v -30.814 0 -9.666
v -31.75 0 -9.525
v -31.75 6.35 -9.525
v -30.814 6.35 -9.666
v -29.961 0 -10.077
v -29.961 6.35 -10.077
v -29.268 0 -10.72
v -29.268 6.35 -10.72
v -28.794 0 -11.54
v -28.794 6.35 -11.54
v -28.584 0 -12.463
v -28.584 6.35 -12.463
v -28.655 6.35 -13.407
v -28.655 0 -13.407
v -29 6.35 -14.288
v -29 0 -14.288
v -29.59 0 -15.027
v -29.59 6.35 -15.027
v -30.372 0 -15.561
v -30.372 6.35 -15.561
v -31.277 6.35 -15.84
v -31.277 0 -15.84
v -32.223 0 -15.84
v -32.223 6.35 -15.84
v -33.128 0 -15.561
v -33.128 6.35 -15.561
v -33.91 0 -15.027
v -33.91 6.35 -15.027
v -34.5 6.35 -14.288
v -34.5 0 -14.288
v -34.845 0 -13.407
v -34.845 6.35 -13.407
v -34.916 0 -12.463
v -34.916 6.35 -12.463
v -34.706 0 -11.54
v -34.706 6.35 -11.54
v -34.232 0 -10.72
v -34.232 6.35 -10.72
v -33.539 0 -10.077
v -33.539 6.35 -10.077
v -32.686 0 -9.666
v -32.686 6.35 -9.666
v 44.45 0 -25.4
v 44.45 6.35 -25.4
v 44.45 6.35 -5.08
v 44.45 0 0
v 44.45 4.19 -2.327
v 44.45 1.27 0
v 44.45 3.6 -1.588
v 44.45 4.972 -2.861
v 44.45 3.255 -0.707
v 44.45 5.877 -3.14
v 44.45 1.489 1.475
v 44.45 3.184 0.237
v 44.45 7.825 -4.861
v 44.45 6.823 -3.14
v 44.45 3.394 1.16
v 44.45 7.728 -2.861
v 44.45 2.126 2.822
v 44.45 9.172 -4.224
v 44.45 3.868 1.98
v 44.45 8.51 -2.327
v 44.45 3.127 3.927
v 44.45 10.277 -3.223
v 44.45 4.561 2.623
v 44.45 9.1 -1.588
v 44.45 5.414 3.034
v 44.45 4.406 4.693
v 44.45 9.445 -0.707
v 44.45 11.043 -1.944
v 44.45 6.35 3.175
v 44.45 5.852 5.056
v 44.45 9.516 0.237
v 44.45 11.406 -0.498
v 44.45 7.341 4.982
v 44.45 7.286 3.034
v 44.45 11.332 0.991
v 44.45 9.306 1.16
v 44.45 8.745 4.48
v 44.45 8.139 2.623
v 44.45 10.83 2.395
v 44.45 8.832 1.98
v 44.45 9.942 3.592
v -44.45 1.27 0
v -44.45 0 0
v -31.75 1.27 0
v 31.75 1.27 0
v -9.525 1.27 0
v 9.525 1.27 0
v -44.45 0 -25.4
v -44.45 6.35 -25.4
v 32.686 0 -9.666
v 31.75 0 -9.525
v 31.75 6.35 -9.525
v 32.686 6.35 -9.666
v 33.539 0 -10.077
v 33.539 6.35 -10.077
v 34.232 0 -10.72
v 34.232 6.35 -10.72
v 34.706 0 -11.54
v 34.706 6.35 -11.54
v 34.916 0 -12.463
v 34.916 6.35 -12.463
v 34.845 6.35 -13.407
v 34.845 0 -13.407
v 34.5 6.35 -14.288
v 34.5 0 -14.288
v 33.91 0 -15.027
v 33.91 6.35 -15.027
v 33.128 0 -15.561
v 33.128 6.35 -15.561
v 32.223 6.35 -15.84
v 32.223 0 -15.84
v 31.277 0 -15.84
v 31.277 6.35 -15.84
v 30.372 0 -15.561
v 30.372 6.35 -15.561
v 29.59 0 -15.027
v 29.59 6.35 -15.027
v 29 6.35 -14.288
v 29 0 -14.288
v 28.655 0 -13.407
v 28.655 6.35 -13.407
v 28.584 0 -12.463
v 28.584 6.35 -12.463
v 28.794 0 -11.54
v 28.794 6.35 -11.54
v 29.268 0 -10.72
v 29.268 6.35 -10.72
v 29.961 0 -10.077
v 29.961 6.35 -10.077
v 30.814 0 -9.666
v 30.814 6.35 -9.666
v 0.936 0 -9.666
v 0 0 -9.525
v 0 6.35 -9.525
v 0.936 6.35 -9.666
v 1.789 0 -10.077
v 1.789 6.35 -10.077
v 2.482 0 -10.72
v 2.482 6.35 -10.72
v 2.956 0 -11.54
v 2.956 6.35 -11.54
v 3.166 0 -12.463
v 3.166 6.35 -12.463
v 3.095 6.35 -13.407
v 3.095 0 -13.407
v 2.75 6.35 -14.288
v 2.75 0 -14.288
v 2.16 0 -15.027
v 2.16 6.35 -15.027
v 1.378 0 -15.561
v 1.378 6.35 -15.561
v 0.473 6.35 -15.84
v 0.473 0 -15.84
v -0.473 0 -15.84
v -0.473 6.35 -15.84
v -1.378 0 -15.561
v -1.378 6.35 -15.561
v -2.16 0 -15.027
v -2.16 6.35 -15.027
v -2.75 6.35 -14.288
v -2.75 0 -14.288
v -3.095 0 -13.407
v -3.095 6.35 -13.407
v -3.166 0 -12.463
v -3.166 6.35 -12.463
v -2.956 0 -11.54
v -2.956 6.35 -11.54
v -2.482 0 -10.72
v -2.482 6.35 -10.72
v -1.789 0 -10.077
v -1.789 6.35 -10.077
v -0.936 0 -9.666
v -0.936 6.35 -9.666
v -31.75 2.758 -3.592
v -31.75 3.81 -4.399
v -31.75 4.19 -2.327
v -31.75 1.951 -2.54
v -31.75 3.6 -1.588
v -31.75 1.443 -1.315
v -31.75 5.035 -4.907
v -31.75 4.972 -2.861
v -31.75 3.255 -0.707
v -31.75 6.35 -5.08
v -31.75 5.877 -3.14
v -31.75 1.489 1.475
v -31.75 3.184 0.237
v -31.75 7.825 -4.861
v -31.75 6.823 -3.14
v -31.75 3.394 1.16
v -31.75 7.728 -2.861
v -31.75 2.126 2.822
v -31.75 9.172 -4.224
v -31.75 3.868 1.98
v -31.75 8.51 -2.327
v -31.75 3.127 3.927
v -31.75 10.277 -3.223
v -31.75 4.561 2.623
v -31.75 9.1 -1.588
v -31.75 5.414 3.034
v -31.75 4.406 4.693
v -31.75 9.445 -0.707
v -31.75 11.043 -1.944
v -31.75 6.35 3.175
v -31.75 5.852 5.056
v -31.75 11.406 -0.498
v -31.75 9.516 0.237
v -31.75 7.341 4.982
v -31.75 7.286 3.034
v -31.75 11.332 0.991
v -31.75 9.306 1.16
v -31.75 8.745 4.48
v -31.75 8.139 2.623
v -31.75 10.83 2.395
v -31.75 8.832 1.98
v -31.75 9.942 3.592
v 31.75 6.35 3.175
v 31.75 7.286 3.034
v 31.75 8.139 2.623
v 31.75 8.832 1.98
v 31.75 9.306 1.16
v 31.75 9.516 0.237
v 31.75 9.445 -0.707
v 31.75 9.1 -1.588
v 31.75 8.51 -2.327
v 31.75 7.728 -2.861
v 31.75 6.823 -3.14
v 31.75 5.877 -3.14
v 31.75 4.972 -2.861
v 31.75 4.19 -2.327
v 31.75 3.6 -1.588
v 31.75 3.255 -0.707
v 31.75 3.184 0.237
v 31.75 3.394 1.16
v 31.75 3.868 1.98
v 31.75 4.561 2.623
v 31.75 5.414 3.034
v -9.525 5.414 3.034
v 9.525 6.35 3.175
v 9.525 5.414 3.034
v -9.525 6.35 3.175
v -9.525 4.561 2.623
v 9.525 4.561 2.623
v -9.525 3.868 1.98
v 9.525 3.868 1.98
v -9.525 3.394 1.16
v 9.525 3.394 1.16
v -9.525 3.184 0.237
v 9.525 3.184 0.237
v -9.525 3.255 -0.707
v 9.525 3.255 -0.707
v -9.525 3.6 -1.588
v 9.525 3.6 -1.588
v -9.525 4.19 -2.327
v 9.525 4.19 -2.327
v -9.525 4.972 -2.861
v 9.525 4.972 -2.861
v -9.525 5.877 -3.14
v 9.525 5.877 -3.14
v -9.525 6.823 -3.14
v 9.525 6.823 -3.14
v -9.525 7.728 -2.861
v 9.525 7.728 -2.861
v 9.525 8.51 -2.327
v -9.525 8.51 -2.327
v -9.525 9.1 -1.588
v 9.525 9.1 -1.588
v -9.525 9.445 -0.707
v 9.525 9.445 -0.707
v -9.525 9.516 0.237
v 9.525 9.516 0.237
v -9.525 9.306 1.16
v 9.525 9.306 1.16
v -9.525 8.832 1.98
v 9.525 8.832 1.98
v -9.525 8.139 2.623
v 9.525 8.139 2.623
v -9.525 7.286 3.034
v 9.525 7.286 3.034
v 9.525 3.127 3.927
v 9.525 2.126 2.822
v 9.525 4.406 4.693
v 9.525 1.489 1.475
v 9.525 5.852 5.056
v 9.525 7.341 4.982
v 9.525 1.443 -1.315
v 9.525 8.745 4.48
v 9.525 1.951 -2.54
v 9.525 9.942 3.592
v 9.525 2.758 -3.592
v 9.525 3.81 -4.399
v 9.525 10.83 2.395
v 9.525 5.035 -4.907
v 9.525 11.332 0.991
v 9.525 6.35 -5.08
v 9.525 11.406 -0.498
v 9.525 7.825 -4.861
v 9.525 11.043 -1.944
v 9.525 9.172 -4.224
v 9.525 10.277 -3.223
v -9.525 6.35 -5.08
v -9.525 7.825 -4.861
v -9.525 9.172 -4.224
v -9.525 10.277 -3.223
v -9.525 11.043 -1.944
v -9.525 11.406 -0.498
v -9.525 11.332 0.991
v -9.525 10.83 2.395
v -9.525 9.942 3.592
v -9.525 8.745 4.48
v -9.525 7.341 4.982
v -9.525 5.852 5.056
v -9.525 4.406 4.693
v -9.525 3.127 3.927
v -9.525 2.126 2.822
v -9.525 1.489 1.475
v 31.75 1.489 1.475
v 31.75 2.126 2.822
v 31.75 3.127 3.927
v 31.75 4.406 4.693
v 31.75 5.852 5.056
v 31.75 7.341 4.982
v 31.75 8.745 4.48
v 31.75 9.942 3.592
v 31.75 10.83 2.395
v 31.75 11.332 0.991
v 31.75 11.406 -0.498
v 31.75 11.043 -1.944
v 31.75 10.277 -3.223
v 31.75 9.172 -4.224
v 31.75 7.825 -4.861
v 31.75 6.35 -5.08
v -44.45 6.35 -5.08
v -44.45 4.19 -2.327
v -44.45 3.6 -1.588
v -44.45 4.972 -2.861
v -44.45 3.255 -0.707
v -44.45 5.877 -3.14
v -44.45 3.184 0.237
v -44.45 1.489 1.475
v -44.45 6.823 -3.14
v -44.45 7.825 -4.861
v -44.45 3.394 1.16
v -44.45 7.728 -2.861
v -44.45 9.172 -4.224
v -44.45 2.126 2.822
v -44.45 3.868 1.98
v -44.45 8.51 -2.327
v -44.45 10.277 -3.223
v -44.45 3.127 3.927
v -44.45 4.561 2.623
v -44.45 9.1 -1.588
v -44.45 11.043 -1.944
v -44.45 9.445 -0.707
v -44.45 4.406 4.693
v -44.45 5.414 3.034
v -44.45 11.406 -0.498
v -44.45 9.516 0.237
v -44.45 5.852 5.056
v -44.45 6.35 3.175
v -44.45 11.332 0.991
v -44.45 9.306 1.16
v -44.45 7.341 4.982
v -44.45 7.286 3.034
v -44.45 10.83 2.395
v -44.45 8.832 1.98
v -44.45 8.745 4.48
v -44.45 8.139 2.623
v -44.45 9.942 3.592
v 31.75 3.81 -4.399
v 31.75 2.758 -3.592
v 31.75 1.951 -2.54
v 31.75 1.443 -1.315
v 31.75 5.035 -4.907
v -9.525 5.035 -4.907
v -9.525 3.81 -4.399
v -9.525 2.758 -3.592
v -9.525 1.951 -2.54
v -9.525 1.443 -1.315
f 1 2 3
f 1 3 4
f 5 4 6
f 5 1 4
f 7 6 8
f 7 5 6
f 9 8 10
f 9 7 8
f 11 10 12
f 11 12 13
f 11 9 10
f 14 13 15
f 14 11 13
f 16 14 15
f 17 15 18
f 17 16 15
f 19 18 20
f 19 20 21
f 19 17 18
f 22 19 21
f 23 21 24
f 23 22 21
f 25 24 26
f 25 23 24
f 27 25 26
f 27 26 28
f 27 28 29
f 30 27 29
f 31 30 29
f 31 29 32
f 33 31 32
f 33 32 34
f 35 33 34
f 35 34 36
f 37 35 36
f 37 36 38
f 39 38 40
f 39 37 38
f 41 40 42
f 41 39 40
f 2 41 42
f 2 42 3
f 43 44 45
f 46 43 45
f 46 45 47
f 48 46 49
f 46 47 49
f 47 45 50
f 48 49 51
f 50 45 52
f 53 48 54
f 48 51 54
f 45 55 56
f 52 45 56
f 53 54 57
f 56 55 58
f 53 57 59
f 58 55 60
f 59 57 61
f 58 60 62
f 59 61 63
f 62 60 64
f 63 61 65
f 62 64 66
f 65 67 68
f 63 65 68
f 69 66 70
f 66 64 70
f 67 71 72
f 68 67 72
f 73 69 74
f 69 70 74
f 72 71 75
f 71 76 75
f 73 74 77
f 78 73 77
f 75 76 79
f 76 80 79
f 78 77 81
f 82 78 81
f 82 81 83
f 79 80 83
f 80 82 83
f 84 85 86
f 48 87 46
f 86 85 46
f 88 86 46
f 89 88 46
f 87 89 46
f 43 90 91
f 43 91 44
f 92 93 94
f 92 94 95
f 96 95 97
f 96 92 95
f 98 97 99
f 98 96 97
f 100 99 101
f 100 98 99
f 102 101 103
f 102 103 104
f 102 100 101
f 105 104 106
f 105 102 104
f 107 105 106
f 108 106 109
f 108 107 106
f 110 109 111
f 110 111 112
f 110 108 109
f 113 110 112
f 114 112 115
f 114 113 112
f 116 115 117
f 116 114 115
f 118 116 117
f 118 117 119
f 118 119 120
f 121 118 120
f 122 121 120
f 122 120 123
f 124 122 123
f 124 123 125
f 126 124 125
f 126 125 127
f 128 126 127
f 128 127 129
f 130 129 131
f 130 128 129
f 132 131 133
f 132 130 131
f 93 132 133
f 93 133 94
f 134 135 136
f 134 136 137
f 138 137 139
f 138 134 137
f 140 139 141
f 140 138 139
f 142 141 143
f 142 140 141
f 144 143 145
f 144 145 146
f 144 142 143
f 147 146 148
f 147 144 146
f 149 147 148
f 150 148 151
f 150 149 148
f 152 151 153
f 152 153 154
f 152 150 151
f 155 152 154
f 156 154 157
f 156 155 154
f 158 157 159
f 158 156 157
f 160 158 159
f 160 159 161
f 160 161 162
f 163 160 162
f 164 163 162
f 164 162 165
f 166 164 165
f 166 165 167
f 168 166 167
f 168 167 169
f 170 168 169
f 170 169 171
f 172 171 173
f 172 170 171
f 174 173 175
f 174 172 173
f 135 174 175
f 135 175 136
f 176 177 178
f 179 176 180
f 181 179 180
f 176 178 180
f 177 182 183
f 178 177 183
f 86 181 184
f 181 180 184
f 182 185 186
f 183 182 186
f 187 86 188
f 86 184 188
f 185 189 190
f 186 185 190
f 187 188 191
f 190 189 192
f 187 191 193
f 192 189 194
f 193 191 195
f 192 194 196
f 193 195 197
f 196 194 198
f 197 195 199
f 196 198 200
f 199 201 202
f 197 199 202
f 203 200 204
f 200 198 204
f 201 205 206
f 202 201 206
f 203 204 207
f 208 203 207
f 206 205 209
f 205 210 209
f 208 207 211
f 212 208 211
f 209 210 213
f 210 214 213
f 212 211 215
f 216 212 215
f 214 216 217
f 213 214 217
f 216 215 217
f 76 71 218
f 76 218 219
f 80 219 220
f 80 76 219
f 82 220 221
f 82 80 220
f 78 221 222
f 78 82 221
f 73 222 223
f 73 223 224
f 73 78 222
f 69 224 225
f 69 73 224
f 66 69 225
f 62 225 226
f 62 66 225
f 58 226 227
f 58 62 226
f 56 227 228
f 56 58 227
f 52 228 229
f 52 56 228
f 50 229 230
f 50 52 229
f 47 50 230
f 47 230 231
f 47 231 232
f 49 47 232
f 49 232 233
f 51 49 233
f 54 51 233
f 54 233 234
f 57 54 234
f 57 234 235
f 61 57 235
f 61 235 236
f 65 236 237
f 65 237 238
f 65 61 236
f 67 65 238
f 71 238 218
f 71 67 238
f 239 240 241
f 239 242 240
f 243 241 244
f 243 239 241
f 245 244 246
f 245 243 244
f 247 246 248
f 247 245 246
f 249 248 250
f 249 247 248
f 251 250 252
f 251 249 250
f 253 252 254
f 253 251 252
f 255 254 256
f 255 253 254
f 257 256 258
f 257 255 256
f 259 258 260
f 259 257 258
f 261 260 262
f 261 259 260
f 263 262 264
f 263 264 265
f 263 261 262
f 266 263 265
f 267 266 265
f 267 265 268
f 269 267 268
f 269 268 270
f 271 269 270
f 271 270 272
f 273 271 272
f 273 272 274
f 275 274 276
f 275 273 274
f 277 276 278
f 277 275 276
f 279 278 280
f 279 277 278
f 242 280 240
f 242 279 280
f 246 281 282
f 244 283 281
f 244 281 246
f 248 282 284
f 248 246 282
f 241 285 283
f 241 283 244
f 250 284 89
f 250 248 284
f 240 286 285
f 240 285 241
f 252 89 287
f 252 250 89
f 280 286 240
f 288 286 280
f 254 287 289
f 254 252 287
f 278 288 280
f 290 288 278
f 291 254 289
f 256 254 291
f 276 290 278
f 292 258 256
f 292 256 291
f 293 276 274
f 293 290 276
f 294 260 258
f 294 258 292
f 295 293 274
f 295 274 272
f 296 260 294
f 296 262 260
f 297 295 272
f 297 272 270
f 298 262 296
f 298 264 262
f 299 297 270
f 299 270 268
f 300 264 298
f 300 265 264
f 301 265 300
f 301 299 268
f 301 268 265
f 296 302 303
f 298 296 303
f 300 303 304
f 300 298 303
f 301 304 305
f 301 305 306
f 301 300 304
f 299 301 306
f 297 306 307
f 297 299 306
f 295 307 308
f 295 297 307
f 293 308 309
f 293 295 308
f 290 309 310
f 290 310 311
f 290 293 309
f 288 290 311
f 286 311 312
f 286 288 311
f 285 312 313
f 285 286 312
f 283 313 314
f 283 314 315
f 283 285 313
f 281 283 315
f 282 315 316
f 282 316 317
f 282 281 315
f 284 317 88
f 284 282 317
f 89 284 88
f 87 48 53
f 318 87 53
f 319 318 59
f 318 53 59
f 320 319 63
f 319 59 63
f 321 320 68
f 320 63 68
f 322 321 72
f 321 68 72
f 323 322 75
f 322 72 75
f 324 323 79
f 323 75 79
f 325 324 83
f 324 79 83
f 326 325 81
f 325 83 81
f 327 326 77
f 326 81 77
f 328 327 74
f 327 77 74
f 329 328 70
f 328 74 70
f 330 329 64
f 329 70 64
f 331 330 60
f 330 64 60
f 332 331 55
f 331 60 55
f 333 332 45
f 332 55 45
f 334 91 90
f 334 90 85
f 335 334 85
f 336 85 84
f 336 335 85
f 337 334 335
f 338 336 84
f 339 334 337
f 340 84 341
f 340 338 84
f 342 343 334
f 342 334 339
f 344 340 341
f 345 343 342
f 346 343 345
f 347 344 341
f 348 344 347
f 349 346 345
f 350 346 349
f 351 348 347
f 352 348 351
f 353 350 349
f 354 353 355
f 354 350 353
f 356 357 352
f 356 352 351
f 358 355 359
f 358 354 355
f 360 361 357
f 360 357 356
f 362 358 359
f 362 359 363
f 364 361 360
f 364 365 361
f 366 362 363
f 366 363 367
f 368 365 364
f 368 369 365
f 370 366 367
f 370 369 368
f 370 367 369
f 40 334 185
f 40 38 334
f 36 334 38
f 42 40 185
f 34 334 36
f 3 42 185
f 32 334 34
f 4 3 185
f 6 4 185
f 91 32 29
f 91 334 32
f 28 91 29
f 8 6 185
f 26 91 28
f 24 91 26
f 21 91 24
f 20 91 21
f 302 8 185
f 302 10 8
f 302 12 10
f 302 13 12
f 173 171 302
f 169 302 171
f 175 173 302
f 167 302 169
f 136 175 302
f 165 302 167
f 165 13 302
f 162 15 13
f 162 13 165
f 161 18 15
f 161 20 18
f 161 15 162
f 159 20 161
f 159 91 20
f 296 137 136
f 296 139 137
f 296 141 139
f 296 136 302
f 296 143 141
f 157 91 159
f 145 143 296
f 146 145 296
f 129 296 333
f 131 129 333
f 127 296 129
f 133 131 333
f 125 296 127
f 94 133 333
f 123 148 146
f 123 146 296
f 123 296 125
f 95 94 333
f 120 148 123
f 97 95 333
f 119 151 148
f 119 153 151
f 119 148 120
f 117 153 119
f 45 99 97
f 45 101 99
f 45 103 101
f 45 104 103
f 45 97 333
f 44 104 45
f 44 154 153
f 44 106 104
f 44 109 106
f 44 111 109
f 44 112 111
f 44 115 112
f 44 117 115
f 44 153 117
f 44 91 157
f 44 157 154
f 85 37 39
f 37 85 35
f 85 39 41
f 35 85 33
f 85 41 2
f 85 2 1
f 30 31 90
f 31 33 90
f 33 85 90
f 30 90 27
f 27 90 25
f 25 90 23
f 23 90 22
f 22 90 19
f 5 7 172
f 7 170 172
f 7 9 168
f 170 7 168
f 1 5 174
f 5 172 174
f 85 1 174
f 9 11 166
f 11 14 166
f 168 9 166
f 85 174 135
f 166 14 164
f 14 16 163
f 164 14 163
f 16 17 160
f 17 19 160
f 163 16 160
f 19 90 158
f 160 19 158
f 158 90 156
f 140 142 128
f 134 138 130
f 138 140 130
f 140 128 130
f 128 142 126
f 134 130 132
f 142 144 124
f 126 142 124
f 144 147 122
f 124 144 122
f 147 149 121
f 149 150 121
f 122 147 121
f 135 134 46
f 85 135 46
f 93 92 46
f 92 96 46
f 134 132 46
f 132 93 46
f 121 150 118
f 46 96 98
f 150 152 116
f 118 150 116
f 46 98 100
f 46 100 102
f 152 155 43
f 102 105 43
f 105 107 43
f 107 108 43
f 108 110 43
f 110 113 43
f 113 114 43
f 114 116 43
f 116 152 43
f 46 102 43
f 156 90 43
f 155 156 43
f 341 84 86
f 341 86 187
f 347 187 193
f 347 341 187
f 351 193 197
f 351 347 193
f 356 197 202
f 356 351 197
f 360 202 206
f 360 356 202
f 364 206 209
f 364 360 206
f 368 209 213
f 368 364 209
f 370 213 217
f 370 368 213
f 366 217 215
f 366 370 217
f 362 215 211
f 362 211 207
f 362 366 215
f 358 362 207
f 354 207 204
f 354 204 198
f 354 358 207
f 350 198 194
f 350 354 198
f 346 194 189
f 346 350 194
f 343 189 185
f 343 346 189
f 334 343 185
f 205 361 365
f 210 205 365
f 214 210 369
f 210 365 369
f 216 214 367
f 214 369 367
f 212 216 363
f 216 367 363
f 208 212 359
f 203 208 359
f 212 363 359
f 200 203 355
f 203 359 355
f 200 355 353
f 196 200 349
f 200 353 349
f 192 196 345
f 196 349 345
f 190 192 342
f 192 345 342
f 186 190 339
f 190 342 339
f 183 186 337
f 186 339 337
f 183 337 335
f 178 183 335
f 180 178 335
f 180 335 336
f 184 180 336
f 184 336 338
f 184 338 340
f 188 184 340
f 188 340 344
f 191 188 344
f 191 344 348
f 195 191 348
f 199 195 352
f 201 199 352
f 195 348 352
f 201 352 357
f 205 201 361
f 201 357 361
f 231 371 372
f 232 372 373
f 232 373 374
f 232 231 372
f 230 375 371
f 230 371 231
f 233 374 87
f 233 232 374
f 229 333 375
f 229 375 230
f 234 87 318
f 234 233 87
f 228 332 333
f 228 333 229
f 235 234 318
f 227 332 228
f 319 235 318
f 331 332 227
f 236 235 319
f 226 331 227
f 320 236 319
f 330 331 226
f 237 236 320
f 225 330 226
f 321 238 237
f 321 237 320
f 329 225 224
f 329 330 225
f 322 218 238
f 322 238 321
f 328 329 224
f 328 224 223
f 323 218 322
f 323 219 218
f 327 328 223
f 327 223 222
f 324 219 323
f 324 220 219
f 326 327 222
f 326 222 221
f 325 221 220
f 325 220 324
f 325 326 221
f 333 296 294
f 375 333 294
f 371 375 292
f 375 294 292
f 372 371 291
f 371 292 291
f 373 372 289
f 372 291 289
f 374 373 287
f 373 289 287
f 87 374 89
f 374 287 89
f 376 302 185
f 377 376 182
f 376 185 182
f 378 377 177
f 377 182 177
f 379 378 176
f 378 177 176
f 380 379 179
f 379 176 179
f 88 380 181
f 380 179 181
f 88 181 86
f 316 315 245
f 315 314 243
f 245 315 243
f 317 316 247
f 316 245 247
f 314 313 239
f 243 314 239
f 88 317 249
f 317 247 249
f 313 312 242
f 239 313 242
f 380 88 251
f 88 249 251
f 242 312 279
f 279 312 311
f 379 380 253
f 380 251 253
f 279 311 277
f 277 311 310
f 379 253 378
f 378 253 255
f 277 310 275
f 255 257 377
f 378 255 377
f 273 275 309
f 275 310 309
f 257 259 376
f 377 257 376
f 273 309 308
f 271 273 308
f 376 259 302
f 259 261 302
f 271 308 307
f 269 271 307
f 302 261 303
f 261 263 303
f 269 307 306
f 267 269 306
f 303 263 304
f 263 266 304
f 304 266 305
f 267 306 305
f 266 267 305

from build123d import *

# Parameters (mm, degrees)
SKETCH2_W           = 88.9
SKETCH2_H           = 25.4
SKETCH2_R           = 3.175
BOSS_EXTRUDE1_DEPTH = 6.35
SKETCH3_R           = 5.08
CUT_EXTRUDE1_DEPTH  = 93.675198948
SKETCH4_R           = 5.08
SKETCH4_R_2         = 3.175
BOSS_EXTRUDE2_DEPTH = 12.7
SKETCH5_R           = 5.08
SKETCH5_R_2         = 3.175
BOSS_EXTRUDE3_DEPTH = 9.525


with BuildPart() as part:
    # Sketch2 → Boss-Extrude1 (new body)
    with BuildSketch(Plane(origin=(0, 0, 0), x_dir=(1, 0, 0), z_dir=(0, 1, 0))):
        with Locations((0, 12.7)):
            Rectangle(SKETCH2_W, SKETCH2_H)
        with Locations(Location((-31.75, 12.7, 0), (0, 0, 270))):
            Circle(SKETCH2_R, mode=Mode.SUBTRACT)
        with Locations(Location((0, 12.7, 0), (0, 0, 270))):
            Circle(SKETCH2_R, mode=Mode.SUBTRACT)
        with Locations(Location((31.75, 12.7, 0), (0, 0, 270))):
            Circle(SKETCH2_R, mode=Mode.SUBTRACT)
    extrude(amount=BOSS_EXTRUDE1_DEPTH)

    # Sketch3 → Cut-Extrude1 (cut, through all)
    with BuildSketch(Plane.ZY.offset(44.45)):
        with Locations((0, 6.35)):
            Circle(SKETCH3_R)
    extrude(amount=-CUT_EXTRUDE1_DEPTH, mode=Mode.SUBTRACT)

    # Sketch4 → Boss-Extrude2 (add)
    with BuildSketch(Plane.ZY.offset(44.45)):
        with Locations((0, 6.35)):
            Circle(SKETCH4_R)
        with Locations((0, 6.35)):
            Circle(SKETCH4_R_2, mode=Mode.SUBTRACT)
    boss_extrude2 = extrude(amount=-BOSS_EXTRUDE2_DEPTH)

    # Mirror1: Boss-Extrude2 across plane
    add(boss_extrude2.mirror(Plane(origin=(0, 0, 0), x_dir=(0, 0, 1), z_dir=(1, 0, 0))))

    # Sketch5 → Boss-Extrude3 (add, symmetric)
    with BuildSketch(Plane(origin=(0, 0, 0), x_dir=(0, 0, -1), z_dir=(1, 0, 0))):
        with Locations((0, 6.35)):
            Circle(SKETCH5_R)
        with Locations(Location((0, 6.35, 0), (0, 0, 180))):
            Circle(SKETCH5_R_2, mode=Mode.SUBTRACT)
    extrude(amount=BOSS_EXTRUDE3_DEPTH, both=True)


solid = part.part
